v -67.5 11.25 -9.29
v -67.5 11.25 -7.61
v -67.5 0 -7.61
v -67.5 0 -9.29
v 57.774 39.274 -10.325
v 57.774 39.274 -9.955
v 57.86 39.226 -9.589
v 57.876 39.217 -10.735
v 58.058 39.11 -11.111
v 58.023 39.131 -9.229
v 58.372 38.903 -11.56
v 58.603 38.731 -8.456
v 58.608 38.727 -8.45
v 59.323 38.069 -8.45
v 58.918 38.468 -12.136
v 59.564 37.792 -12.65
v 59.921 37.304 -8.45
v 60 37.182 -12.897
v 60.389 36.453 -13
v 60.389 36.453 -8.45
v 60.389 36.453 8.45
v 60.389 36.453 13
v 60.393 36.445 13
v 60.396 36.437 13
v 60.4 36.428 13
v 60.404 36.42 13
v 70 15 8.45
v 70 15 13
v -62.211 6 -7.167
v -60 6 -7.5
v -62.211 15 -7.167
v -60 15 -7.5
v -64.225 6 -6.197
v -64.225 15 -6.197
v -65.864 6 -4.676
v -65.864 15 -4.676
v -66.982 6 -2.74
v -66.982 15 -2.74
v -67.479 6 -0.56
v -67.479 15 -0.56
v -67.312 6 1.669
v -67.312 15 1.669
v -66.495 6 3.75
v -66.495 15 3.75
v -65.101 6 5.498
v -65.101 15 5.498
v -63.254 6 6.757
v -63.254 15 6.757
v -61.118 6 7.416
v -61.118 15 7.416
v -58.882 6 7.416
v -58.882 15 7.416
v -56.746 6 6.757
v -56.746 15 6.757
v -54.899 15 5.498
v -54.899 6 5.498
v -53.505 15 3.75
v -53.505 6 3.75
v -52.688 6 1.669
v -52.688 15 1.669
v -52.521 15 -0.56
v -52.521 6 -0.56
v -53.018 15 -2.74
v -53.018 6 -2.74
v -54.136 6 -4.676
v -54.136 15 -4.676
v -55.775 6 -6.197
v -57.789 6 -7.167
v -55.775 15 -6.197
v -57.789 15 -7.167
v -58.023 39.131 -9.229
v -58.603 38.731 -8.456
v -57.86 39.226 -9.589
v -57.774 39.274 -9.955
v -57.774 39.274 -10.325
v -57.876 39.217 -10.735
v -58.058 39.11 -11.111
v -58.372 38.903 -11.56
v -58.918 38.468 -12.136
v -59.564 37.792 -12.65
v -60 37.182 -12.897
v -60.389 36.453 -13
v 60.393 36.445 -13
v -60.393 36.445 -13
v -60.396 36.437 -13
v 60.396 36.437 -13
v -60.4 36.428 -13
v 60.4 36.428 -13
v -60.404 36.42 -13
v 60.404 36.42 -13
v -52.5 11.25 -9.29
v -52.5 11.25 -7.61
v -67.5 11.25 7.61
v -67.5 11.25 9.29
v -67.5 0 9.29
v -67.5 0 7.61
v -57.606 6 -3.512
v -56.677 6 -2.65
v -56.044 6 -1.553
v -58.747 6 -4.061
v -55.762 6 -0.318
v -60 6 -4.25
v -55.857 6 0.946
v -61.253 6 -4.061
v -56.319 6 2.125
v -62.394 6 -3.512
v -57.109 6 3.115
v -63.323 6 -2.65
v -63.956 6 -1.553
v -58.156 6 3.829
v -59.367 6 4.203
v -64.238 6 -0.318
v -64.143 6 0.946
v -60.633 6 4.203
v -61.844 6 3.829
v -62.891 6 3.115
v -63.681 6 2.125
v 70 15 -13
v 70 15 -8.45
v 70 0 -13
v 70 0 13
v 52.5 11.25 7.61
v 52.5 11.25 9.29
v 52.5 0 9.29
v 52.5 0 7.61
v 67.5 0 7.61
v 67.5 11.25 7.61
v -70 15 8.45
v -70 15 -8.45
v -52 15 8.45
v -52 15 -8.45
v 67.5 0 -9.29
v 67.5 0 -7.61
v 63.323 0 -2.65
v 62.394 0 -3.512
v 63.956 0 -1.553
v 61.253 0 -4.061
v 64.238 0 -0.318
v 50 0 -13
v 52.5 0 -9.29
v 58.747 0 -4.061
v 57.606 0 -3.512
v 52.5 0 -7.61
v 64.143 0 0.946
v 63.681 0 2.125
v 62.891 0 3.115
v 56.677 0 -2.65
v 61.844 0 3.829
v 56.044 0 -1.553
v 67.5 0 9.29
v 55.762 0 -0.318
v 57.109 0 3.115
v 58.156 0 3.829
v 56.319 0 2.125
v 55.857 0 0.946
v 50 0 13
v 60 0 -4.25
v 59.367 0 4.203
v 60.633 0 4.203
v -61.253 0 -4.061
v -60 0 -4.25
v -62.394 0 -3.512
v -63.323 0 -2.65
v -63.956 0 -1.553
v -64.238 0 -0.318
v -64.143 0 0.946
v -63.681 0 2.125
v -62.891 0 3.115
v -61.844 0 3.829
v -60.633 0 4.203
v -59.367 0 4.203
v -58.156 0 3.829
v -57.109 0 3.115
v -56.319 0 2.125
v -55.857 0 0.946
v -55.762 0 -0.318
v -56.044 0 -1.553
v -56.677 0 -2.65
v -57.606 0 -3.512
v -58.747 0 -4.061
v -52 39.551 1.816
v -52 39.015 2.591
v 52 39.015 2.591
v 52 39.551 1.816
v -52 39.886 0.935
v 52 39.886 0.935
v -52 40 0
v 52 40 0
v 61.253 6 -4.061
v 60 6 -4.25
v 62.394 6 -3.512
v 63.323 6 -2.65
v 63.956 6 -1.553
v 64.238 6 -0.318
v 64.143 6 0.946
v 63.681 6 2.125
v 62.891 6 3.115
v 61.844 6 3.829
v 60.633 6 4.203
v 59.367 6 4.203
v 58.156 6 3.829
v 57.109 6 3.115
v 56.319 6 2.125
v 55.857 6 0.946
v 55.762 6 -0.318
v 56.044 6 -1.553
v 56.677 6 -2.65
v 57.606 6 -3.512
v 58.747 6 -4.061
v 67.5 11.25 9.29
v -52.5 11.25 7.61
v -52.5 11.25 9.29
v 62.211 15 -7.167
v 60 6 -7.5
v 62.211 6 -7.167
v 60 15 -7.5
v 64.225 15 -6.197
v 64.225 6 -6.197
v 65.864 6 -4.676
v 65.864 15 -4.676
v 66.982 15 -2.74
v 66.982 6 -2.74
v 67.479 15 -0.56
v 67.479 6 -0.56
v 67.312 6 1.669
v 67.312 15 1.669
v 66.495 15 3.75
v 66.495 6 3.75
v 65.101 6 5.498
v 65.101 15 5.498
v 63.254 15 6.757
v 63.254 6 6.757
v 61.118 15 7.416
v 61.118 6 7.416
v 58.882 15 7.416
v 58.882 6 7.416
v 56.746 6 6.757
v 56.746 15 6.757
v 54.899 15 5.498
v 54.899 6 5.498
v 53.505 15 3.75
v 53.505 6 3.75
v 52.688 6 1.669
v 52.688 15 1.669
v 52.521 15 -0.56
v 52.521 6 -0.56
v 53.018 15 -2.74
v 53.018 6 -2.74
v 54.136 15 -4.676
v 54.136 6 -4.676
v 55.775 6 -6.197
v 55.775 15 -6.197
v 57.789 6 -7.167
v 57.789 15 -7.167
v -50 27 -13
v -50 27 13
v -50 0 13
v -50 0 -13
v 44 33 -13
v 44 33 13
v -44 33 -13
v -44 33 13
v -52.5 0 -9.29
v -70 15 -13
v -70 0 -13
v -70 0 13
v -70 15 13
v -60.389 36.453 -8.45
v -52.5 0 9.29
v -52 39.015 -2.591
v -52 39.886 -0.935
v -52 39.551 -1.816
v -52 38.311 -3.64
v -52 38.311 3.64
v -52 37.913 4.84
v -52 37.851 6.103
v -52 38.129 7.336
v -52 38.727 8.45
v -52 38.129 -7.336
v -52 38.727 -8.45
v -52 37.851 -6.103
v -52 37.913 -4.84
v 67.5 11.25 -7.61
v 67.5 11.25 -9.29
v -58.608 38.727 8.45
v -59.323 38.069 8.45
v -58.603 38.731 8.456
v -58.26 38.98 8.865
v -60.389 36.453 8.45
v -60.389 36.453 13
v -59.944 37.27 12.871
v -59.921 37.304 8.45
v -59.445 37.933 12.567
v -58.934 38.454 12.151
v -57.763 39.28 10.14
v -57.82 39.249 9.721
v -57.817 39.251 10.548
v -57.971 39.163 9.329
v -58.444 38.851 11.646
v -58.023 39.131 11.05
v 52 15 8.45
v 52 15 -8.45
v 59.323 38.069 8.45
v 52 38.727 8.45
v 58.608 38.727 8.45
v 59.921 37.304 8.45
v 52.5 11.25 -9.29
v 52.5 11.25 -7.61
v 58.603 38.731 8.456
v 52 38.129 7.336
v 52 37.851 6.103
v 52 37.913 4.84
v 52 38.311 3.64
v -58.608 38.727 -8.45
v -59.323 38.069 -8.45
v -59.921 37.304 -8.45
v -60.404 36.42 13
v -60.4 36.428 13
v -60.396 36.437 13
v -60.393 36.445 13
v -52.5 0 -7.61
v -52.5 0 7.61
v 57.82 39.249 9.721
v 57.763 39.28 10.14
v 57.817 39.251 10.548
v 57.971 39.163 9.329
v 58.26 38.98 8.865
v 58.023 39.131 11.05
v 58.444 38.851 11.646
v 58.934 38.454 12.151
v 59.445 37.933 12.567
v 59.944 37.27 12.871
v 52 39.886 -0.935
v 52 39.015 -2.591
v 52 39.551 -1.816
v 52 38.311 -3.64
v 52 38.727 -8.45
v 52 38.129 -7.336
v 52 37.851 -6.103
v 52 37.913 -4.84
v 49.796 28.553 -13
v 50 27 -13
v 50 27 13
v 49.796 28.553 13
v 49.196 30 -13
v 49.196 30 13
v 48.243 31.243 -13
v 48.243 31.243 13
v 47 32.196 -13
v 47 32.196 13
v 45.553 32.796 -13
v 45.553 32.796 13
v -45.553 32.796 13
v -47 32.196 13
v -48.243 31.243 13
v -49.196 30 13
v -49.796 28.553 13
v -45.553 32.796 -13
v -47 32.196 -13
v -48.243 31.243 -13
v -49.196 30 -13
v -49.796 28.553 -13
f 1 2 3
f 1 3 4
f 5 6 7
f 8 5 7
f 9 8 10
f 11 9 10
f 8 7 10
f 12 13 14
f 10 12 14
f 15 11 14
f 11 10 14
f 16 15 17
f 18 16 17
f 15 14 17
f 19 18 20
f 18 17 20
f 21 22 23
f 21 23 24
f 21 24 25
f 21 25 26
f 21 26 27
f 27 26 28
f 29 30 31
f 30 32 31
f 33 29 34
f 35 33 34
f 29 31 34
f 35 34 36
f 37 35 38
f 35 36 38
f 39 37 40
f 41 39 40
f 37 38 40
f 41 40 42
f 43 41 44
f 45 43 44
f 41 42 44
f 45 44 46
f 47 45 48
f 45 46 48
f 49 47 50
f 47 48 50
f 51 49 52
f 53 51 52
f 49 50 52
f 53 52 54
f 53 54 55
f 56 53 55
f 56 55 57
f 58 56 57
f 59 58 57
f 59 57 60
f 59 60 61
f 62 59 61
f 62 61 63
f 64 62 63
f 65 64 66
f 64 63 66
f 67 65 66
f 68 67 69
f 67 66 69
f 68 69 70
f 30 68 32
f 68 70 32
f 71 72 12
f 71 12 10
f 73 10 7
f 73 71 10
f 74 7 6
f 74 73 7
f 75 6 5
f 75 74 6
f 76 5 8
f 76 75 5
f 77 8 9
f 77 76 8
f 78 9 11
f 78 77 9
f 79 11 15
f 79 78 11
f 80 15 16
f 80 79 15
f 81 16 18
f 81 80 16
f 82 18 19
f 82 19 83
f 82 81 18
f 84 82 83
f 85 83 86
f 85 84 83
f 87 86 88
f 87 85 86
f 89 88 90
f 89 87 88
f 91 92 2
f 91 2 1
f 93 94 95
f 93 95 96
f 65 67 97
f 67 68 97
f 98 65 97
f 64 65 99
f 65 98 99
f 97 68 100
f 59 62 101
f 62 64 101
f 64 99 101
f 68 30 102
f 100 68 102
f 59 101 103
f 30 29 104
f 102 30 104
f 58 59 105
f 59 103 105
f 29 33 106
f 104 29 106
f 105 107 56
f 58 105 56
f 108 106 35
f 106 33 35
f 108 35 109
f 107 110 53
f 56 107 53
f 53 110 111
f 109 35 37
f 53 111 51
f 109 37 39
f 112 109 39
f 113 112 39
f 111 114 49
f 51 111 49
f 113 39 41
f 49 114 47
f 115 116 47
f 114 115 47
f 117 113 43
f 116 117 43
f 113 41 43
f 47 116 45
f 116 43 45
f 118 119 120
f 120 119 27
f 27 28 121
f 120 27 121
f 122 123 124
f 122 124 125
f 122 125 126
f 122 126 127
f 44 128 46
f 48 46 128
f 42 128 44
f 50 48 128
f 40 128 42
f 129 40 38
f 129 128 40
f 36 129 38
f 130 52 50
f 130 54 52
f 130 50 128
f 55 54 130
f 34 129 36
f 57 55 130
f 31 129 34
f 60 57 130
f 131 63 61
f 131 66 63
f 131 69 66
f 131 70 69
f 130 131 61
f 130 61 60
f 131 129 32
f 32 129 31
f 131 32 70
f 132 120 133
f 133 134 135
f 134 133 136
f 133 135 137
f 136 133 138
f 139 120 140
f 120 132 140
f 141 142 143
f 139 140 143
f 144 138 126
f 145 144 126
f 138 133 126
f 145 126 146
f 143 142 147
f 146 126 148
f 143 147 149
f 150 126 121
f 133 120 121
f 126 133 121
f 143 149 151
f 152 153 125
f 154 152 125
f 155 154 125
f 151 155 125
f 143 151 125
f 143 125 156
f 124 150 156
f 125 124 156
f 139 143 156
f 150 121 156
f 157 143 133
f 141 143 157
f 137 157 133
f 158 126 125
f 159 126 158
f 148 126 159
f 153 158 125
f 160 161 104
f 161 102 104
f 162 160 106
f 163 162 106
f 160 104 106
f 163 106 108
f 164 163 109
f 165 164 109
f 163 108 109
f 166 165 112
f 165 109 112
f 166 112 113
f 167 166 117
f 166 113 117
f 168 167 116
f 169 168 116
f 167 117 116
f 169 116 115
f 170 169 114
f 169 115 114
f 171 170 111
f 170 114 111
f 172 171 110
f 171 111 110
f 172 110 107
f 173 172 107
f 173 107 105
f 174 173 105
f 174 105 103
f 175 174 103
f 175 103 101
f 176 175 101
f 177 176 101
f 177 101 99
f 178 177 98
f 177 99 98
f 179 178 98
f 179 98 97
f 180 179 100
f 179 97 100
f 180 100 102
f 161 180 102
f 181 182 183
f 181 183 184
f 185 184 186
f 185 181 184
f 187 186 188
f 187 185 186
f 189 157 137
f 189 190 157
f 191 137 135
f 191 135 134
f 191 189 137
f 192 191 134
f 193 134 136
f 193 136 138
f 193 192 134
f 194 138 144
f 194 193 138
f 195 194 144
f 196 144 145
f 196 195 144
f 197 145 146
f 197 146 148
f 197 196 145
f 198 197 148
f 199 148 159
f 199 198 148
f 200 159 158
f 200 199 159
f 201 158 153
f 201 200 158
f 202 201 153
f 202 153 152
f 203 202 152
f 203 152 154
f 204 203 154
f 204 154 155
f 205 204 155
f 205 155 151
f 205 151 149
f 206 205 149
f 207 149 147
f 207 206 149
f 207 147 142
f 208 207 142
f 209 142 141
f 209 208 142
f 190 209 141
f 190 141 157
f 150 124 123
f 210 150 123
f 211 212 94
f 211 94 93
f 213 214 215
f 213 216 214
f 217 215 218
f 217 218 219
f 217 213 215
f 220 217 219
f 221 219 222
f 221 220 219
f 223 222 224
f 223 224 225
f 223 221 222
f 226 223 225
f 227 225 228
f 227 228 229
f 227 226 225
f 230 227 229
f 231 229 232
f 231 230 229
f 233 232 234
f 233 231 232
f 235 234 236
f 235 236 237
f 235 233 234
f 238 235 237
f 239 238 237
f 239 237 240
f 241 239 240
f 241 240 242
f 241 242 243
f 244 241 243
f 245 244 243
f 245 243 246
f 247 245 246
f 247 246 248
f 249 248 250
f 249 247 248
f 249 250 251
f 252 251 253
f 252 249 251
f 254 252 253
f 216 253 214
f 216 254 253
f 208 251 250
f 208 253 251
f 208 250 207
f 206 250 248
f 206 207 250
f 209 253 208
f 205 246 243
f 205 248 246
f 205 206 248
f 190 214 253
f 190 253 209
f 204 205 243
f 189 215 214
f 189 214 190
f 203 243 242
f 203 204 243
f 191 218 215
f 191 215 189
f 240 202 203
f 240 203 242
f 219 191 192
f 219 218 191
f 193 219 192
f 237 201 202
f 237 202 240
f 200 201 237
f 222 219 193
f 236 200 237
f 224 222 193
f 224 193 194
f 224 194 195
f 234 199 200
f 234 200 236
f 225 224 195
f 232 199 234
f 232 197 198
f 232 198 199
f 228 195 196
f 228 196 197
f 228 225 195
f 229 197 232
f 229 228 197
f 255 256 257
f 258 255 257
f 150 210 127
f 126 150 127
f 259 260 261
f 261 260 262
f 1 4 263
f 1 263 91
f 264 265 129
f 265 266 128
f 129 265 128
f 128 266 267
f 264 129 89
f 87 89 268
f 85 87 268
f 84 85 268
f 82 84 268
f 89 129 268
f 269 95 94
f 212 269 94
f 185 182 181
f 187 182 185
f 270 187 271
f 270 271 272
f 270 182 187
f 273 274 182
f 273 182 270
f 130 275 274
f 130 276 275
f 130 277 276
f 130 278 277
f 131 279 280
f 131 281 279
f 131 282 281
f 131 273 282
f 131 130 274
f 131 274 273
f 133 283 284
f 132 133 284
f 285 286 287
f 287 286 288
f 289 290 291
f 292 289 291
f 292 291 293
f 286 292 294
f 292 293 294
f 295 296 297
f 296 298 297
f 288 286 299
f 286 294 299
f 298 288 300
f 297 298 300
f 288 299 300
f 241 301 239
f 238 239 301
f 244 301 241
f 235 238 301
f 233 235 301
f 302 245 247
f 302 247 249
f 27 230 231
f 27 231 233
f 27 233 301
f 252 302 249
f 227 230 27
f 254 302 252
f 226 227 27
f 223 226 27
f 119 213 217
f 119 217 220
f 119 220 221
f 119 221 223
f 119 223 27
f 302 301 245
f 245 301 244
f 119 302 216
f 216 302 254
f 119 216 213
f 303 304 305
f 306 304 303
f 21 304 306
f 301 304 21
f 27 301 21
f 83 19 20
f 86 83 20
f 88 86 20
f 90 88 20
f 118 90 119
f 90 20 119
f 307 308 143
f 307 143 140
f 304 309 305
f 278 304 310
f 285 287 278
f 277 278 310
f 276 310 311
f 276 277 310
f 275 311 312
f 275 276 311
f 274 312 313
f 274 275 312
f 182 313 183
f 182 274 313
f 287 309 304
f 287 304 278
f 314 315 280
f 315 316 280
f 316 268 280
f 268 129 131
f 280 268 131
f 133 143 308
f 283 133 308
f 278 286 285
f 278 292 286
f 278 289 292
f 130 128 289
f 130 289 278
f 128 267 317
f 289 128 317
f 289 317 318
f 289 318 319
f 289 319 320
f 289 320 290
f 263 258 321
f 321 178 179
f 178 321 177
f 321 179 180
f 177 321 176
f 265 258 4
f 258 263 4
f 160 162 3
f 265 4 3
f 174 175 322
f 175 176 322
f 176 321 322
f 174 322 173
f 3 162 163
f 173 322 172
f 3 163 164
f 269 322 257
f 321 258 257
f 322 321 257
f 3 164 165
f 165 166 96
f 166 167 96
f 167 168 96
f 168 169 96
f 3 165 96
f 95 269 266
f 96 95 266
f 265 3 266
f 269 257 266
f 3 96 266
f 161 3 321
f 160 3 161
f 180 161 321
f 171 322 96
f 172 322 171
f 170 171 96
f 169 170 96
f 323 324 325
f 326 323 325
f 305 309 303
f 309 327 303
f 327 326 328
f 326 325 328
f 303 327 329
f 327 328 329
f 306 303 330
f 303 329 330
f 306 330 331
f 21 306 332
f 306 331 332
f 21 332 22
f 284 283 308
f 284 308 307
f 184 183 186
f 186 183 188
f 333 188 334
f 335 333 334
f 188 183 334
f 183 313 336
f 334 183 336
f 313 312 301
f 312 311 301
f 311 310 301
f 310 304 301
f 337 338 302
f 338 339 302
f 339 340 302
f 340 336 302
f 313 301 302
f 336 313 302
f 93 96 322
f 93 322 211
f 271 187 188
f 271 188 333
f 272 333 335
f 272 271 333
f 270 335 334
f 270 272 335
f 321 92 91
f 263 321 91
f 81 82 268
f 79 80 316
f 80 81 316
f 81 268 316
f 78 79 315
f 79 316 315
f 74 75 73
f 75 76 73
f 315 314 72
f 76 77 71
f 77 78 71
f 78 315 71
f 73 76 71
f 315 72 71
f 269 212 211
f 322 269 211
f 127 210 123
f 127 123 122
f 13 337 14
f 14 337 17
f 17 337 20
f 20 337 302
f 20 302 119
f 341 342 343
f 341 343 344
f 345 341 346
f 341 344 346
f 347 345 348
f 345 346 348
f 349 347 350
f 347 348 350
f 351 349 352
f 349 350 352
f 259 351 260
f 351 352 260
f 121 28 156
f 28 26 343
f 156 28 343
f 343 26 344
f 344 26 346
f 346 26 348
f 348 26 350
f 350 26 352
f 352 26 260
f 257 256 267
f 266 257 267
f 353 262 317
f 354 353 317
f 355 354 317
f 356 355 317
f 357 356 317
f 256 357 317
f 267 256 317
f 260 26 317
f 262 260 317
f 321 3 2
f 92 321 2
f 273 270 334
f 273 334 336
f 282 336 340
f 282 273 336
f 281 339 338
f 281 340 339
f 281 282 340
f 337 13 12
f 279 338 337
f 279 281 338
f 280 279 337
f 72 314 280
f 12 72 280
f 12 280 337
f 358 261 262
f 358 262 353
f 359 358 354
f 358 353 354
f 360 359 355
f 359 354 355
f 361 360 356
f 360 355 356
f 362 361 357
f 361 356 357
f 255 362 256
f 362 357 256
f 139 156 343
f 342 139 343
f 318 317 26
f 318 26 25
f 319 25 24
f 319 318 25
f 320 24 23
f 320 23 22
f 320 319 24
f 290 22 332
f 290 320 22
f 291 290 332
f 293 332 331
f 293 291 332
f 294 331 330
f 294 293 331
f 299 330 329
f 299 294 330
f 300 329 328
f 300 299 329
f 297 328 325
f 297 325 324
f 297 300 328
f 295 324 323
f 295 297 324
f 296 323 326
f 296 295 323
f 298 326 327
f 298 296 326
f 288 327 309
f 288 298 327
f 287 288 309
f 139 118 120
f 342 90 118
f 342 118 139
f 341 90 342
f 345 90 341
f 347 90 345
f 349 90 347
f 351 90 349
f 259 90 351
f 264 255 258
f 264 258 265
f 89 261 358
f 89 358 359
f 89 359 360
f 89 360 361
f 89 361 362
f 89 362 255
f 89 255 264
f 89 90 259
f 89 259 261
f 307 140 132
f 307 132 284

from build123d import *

# Parameters (mm, degrees)
EXTRUDE_START            = 13
EXTRUDE_1_DEPTH          = 26
CUT_EXTRUDE_1_DEPTH      = 70
CUT_EXTRUDE_1_DEPTH_BACK = 70
CUT_EXTRUDE_START        = 15
SKETCH_5_W               = 18
SKETCH_5_H               = 16.9
CUT_EXTRUDE_2_DEPTH      = 25
CUT_EXTRUDE_START_2      = 52.5
SKETCH_7_W               = 1.68
SKETCH_7_H               = 11.25
CUT_EXTRUDE_3_DEPTH      = 15
CUT_EXTRUDE_START_3      = -67.5
SKETCH_7_2_W             = 1.68
SKETCH_7_2_H             = 11.25
CUT_EXTRUDE_4_DEPTH      = 15


with BuildPart() as part:
    # 草图3 → 凸台-拉伸1 (new body)
    with BuildSketch(Plane.XY.offset(EXTRUDE_START)):
        with BuildLine():
            Line((-70, 15), (-60.389021238, 36.453077594))
            ThreePointArc((-60.389021238, 36.453077594), (-58.175420496, 39.035795149), (-54.913401609, 40))
            Line((-54.913401609, 40), (54.913401609, 40))
            ThreePointArc((54.913401609, 40), (58.175420496, 39.035795149), (60.389021238, 36.453077594))
            Line((60.389021238, 36.453077594), (70, 15))
            Line((70, 15), (70, 0))
            Line((70, 0), (50, 0))
            Line((50, 0), (50, 27))
            ThreePointArc((50, 27), (48.242640687, 31.242640687), (44, 33))
            Line((44, 33), (-44, 33))
            ThreePointArc((-44, 33), (-48.242640687, 31.242640687), (-50, 27))
            Line((-50, 27), (-50, 0))
            Line((-50, 0), (-70, 0))
            Line((-70, 0), (-70, 15))
        make_face()
    extrude(amount=-EXTRUDE_1_DEPTH)

    # 草图4 → 切除-拉伸1 (cut, two sides: drawn at the far end of the back side and taken through both)
    with BuildSketch(Plane(origin=(0, 0, 0), x_dir=(0, 0, -1), z_dir=(1, 0, 0)).offset(-CUT_EXTRUDE_1_DEPTH_BACK)):
        with BuildLine():
            Line((13, 36.42), (13, 33))
            Line((13, 33), (14, 33))
            Line((14, 33), (14, 41))
            Line((14, 41), (0, 41))
            Line((0, 41), (0, 40))
            ThreePointArc((0, 40), (1.385720645, 39.745514819), (2.590597511, 39.01527092))
            ThreePointArc((2.590597511, 39.01527092), (5.473035012, 37.839069568), (8.455602061, 38.731364009))
            ThreePointArc((8.455602061, 38.731364009), (11.436576626, 38.969213419), (13, 36.42))
        make_face()
        with BuildLine():
            Line((-14, 33), (-13, 33))
            Line((-13, 33), (-13, 36.42))
            ThreePointArc((-13, 36.42), (-11.436576626, 38.969213419), (-8.455602061, 38.731364009))
            ThreePointArc((-8.455602061, 38.731364009), (-5.473035012, 37.839069568), (-2.590597511, 39.01527092))
            ThreePointArc((-2.590597511, 39.01527092), (-1.385720645, 39.745514819), (0, 40))
            Line((0, 40), (0, 41))
            Line((0, 41), (-14, 41))
            Line((-14, 41), (-14, 33))
        make_face()
    extrude(amount=CUT_EXTRUDE_1_DEPTH + CUT_EXTRUDE_1_DEPTH_BACK, mode=Mode.SUBTRACT)

    # 草图5 → 切除-拉伸2 (cut)
    with BuildSketch(Plane(origin=(0, 0, 0), x_dir=(1, 0, 0), z_dir=(0, 1, 0)).offset(CUT_EXTRUDE_START)):
        with Locations((-61, 0)):
            Rectangle(SKETCH_5_W, SKETCH_5_H)
        with Locations((61, 0)):
            Rectangle(SKETCH_5_W, SKETCH_5_H)
    extrude(amount=CUT_EXTRUDE_2_DEPTH, mode=Mode.SUBTRACT)

    # 草图6 → 切除-旋转1 (revolve, cut)
    with BuildSketch(Plane.XY, mode=Mode.PRIVATE) as cut_revolve_1_sk:
        Polygon((-64.25, 0), (-64.25, 6), (-67.5, 6), (-67.5, 15), (-60, 15), (-60, 0), align=None)
    cut_revolve_1 = revolve(cut_revolve_1_sk.sketch.rotate(Axis((-60, 0, 0), (0, 1, 0)), 270), axis=Axis((-60, 0, 0), (0, 1, 0)), mode=Mode.SUBTRACT)

    # 镜向1: 切除-旋转1 across plane
    add(cut_revolve_1.mirror(Plane(origin=(0, 0, 0), x_dir=(0, 0, 1), z_dir=(1, 0, 0))), mode=Mode.SUBTRACT)

    # 草图7 → 切除-拉伸3 (cut)
    with BuildSketch(Plane(origin=(0, 0, 0), x_dir=(0, 0, -1), z_dir=(1, 0, 0)).offset(CUT_EXTRUDE_START_2)):
        with Locations((8.45, 5.625)):
            Rectangle(SKETCH_7_W, SKETCH_7_H)
        with Locations((-8.45, 5.625)):
            Rectangle(SKETCH_7_W, SKETCH_7_H)
    extrude(amount=CUT_EXTRUDE_3_DEPTH, mode=Mode.SUBTRACT)

    # 草图7<2> → 切除-拉伸4 (cut)
    with BuildSketch(Plane(origin=(0, 0, 0), x_dir=(0, 0, -1), z_dir=(1, 0, 0)).offset(CUT_EXTRUDE_START_3)):
        with Locations((8.45, 5.625)):
            Rectangle(SKETCH_7_2_W, SKETCH_7_2_H)
        with Locations((-8.45, 5.625)):
            Rectangle(SKETCH_7_2_W, SKETCH_7_2_H)
    extrude(amount=CUT_EXTRUDE_4_DEPTH, mode=Mode.SUBTRACT)


solid = part.part
